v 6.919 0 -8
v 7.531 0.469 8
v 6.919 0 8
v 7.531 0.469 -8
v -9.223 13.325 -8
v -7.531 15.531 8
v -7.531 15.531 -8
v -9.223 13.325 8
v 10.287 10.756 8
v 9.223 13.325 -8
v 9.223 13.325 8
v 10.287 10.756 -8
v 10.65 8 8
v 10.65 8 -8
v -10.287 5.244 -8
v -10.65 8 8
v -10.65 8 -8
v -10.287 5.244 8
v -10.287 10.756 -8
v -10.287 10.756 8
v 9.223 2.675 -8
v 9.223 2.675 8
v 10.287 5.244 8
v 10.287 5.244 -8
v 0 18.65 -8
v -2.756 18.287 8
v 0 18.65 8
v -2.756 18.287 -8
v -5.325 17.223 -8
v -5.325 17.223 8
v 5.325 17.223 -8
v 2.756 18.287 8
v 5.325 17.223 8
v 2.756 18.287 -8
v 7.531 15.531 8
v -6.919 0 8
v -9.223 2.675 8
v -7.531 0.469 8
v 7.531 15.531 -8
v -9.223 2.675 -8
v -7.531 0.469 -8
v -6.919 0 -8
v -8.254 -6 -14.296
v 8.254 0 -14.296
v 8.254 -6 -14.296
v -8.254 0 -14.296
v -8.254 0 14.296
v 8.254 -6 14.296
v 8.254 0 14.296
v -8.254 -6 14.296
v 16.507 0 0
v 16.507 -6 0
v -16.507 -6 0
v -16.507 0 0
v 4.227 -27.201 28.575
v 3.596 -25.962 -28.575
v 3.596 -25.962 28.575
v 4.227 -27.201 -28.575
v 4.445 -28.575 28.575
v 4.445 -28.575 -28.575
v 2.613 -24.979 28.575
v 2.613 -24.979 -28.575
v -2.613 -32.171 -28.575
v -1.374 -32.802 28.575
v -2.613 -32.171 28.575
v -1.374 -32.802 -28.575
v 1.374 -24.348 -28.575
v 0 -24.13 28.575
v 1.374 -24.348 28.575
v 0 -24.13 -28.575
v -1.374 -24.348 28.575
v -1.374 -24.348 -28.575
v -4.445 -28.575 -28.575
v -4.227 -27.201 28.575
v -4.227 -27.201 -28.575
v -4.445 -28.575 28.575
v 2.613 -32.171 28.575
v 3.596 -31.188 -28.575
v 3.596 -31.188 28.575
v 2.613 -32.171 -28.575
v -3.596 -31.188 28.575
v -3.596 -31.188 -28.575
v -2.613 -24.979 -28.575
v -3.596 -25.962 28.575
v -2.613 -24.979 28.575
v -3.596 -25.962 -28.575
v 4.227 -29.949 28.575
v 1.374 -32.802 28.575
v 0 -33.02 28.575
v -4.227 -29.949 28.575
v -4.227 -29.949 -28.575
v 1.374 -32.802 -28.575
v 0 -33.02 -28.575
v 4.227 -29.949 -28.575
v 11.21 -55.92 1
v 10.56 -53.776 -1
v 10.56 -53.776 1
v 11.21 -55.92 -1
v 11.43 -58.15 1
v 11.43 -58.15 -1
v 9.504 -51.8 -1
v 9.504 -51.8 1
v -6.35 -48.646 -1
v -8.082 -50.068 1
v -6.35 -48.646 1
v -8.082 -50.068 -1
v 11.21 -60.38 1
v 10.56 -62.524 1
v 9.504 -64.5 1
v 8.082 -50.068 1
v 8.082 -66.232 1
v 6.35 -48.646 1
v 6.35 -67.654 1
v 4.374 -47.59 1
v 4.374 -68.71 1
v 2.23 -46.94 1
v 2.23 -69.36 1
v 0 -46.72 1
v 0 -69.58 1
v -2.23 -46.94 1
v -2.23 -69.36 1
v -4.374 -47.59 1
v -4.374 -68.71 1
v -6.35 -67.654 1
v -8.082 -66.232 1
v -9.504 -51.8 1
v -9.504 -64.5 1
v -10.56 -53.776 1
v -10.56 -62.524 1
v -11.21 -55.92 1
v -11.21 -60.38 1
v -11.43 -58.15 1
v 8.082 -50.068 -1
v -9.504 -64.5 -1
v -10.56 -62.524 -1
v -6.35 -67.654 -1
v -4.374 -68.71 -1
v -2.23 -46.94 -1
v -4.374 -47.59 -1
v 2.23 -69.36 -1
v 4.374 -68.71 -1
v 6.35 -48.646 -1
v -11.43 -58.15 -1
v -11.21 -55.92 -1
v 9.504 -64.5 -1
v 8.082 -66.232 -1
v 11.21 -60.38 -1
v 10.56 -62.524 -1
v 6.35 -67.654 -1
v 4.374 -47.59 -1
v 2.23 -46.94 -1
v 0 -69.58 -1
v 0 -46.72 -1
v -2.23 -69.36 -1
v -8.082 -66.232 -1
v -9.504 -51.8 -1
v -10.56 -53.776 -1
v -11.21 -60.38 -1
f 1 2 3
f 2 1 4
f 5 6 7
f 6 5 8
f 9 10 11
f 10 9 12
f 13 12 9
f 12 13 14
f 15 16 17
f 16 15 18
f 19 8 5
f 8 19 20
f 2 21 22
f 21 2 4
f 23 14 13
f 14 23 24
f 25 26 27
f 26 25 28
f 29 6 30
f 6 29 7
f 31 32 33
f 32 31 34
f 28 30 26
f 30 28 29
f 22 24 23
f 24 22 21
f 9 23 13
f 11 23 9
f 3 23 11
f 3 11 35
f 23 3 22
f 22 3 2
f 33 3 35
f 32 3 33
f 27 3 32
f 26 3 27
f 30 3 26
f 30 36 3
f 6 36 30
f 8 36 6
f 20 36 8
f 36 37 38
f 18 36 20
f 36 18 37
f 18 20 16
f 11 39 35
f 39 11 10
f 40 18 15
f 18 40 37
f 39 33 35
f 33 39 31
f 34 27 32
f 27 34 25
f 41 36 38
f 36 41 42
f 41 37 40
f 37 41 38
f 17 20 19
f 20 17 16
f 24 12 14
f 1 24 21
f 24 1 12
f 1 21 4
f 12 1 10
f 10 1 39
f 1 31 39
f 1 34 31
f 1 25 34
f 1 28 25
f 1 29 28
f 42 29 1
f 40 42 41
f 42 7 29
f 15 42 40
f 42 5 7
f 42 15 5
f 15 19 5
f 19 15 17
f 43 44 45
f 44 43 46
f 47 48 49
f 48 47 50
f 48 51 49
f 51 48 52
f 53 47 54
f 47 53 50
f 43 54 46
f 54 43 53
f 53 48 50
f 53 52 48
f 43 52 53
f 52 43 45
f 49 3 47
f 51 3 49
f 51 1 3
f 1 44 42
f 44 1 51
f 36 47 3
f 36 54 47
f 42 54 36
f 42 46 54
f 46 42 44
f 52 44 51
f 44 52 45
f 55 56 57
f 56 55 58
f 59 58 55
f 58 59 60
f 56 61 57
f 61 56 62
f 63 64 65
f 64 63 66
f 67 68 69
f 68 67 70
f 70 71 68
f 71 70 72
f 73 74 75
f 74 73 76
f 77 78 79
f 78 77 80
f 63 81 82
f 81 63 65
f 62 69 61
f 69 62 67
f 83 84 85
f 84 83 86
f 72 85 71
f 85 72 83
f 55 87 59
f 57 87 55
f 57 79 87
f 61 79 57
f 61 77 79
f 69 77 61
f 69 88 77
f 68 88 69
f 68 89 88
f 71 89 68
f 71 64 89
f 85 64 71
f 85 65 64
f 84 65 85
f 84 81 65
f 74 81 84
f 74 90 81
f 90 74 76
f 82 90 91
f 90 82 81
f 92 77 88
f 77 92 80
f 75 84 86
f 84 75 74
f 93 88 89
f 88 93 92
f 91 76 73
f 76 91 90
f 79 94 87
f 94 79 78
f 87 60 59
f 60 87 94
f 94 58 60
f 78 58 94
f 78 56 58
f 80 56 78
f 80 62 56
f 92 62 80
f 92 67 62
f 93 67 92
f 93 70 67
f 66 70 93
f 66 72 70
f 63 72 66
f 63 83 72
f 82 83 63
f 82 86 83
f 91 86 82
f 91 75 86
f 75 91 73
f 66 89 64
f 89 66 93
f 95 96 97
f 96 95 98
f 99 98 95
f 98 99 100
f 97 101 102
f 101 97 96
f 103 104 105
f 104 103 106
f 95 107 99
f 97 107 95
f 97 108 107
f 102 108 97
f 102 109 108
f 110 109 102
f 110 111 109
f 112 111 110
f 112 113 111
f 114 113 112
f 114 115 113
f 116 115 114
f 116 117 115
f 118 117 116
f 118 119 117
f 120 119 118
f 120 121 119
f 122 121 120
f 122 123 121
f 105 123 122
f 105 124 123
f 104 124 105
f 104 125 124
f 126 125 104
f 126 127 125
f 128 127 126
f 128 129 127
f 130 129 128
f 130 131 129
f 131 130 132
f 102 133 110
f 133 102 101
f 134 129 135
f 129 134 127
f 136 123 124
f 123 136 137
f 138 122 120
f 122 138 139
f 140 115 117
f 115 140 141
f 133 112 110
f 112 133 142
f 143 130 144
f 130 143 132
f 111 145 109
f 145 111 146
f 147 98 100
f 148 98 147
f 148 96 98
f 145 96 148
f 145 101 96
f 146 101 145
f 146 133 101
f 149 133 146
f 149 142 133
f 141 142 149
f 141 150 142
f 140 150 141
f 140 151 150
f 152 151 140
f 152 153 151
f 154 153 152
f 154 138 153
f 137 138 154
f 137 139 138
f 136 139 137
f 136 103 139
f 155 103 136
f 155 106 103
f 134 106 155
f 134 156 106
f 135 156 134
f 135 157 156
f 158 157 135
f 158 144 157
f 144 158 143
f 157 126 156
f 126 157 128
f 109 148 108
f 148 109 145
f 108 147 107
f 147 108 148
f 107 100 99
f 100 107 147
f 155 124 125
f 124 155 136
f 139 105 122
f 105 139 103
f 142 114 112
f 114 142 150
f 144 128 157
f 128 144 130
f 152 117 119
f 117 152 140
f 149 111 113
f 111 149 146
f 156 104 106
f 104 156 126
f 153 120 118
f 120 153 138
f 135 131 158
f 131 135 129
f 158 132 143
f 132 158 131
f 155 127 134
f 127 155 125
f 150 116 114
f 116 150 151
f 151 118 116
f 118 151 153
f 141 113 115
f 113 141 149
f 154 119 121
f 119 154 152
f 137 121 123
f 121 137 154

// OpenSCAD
// Auto-generated by scripts/author_from_manifest.py (Phase D.3).
// Source: data/phase_d_manifest.json (sku_intent='viking-vk457-concealed-155f').
// Do not hand-edit — regenerate from the manifest.
//
// @part viking_vk457_concealed_155f
// @kind sprinkler_head
// @category head.pendant.k56
// @display-name "Viking VK457 Concealed Pendent K5.6 155°F"
// @mfg viking_group
// @mfg-pn VK457
// @listing UL FM
// @hazard-classes LH OH1
// @price-usd 27.40
// @install-minutes 10
// @crew journeyman
// @k-factor 5.6
// @orientation pendant
// @response quick
// @temperature 155F
// @param size_in number default=0.5 label="Size" unit="in"
// @port inlet position=[0,0.014,0] direction=[0,1,0] style=NPT_threaded size_in=0.5 role=drop

size_in = 0.5;
k_factor = 5.6;

length_mm   = 57.15;
body_dia_mm = 25.40;
thread_od   = 21.3;
thread_len  = 16;
deflector_d = body_dia_mm * 0.9;

 union() {
    translate([0, thread_len/2, 0])
        cylinder(h = thread_len, d = thread_od, center = true, $fn = 24);
    translate([0, -3, 0])
        rotate([90, 0, 0])
        cylinder(h = 6, d = thread_od * 1.55, $fn = 6, center = true);
    translate([0, -length_mm/2, 0])
        cylinder(h = length_mm, d = body_dia_mm * 0.35, center = true, $fn = 20);
    translate([0, -length_mm - 1, 0])
        cylinder(h = 2, d = deflector_d, center = true, $fn = 32);
}
